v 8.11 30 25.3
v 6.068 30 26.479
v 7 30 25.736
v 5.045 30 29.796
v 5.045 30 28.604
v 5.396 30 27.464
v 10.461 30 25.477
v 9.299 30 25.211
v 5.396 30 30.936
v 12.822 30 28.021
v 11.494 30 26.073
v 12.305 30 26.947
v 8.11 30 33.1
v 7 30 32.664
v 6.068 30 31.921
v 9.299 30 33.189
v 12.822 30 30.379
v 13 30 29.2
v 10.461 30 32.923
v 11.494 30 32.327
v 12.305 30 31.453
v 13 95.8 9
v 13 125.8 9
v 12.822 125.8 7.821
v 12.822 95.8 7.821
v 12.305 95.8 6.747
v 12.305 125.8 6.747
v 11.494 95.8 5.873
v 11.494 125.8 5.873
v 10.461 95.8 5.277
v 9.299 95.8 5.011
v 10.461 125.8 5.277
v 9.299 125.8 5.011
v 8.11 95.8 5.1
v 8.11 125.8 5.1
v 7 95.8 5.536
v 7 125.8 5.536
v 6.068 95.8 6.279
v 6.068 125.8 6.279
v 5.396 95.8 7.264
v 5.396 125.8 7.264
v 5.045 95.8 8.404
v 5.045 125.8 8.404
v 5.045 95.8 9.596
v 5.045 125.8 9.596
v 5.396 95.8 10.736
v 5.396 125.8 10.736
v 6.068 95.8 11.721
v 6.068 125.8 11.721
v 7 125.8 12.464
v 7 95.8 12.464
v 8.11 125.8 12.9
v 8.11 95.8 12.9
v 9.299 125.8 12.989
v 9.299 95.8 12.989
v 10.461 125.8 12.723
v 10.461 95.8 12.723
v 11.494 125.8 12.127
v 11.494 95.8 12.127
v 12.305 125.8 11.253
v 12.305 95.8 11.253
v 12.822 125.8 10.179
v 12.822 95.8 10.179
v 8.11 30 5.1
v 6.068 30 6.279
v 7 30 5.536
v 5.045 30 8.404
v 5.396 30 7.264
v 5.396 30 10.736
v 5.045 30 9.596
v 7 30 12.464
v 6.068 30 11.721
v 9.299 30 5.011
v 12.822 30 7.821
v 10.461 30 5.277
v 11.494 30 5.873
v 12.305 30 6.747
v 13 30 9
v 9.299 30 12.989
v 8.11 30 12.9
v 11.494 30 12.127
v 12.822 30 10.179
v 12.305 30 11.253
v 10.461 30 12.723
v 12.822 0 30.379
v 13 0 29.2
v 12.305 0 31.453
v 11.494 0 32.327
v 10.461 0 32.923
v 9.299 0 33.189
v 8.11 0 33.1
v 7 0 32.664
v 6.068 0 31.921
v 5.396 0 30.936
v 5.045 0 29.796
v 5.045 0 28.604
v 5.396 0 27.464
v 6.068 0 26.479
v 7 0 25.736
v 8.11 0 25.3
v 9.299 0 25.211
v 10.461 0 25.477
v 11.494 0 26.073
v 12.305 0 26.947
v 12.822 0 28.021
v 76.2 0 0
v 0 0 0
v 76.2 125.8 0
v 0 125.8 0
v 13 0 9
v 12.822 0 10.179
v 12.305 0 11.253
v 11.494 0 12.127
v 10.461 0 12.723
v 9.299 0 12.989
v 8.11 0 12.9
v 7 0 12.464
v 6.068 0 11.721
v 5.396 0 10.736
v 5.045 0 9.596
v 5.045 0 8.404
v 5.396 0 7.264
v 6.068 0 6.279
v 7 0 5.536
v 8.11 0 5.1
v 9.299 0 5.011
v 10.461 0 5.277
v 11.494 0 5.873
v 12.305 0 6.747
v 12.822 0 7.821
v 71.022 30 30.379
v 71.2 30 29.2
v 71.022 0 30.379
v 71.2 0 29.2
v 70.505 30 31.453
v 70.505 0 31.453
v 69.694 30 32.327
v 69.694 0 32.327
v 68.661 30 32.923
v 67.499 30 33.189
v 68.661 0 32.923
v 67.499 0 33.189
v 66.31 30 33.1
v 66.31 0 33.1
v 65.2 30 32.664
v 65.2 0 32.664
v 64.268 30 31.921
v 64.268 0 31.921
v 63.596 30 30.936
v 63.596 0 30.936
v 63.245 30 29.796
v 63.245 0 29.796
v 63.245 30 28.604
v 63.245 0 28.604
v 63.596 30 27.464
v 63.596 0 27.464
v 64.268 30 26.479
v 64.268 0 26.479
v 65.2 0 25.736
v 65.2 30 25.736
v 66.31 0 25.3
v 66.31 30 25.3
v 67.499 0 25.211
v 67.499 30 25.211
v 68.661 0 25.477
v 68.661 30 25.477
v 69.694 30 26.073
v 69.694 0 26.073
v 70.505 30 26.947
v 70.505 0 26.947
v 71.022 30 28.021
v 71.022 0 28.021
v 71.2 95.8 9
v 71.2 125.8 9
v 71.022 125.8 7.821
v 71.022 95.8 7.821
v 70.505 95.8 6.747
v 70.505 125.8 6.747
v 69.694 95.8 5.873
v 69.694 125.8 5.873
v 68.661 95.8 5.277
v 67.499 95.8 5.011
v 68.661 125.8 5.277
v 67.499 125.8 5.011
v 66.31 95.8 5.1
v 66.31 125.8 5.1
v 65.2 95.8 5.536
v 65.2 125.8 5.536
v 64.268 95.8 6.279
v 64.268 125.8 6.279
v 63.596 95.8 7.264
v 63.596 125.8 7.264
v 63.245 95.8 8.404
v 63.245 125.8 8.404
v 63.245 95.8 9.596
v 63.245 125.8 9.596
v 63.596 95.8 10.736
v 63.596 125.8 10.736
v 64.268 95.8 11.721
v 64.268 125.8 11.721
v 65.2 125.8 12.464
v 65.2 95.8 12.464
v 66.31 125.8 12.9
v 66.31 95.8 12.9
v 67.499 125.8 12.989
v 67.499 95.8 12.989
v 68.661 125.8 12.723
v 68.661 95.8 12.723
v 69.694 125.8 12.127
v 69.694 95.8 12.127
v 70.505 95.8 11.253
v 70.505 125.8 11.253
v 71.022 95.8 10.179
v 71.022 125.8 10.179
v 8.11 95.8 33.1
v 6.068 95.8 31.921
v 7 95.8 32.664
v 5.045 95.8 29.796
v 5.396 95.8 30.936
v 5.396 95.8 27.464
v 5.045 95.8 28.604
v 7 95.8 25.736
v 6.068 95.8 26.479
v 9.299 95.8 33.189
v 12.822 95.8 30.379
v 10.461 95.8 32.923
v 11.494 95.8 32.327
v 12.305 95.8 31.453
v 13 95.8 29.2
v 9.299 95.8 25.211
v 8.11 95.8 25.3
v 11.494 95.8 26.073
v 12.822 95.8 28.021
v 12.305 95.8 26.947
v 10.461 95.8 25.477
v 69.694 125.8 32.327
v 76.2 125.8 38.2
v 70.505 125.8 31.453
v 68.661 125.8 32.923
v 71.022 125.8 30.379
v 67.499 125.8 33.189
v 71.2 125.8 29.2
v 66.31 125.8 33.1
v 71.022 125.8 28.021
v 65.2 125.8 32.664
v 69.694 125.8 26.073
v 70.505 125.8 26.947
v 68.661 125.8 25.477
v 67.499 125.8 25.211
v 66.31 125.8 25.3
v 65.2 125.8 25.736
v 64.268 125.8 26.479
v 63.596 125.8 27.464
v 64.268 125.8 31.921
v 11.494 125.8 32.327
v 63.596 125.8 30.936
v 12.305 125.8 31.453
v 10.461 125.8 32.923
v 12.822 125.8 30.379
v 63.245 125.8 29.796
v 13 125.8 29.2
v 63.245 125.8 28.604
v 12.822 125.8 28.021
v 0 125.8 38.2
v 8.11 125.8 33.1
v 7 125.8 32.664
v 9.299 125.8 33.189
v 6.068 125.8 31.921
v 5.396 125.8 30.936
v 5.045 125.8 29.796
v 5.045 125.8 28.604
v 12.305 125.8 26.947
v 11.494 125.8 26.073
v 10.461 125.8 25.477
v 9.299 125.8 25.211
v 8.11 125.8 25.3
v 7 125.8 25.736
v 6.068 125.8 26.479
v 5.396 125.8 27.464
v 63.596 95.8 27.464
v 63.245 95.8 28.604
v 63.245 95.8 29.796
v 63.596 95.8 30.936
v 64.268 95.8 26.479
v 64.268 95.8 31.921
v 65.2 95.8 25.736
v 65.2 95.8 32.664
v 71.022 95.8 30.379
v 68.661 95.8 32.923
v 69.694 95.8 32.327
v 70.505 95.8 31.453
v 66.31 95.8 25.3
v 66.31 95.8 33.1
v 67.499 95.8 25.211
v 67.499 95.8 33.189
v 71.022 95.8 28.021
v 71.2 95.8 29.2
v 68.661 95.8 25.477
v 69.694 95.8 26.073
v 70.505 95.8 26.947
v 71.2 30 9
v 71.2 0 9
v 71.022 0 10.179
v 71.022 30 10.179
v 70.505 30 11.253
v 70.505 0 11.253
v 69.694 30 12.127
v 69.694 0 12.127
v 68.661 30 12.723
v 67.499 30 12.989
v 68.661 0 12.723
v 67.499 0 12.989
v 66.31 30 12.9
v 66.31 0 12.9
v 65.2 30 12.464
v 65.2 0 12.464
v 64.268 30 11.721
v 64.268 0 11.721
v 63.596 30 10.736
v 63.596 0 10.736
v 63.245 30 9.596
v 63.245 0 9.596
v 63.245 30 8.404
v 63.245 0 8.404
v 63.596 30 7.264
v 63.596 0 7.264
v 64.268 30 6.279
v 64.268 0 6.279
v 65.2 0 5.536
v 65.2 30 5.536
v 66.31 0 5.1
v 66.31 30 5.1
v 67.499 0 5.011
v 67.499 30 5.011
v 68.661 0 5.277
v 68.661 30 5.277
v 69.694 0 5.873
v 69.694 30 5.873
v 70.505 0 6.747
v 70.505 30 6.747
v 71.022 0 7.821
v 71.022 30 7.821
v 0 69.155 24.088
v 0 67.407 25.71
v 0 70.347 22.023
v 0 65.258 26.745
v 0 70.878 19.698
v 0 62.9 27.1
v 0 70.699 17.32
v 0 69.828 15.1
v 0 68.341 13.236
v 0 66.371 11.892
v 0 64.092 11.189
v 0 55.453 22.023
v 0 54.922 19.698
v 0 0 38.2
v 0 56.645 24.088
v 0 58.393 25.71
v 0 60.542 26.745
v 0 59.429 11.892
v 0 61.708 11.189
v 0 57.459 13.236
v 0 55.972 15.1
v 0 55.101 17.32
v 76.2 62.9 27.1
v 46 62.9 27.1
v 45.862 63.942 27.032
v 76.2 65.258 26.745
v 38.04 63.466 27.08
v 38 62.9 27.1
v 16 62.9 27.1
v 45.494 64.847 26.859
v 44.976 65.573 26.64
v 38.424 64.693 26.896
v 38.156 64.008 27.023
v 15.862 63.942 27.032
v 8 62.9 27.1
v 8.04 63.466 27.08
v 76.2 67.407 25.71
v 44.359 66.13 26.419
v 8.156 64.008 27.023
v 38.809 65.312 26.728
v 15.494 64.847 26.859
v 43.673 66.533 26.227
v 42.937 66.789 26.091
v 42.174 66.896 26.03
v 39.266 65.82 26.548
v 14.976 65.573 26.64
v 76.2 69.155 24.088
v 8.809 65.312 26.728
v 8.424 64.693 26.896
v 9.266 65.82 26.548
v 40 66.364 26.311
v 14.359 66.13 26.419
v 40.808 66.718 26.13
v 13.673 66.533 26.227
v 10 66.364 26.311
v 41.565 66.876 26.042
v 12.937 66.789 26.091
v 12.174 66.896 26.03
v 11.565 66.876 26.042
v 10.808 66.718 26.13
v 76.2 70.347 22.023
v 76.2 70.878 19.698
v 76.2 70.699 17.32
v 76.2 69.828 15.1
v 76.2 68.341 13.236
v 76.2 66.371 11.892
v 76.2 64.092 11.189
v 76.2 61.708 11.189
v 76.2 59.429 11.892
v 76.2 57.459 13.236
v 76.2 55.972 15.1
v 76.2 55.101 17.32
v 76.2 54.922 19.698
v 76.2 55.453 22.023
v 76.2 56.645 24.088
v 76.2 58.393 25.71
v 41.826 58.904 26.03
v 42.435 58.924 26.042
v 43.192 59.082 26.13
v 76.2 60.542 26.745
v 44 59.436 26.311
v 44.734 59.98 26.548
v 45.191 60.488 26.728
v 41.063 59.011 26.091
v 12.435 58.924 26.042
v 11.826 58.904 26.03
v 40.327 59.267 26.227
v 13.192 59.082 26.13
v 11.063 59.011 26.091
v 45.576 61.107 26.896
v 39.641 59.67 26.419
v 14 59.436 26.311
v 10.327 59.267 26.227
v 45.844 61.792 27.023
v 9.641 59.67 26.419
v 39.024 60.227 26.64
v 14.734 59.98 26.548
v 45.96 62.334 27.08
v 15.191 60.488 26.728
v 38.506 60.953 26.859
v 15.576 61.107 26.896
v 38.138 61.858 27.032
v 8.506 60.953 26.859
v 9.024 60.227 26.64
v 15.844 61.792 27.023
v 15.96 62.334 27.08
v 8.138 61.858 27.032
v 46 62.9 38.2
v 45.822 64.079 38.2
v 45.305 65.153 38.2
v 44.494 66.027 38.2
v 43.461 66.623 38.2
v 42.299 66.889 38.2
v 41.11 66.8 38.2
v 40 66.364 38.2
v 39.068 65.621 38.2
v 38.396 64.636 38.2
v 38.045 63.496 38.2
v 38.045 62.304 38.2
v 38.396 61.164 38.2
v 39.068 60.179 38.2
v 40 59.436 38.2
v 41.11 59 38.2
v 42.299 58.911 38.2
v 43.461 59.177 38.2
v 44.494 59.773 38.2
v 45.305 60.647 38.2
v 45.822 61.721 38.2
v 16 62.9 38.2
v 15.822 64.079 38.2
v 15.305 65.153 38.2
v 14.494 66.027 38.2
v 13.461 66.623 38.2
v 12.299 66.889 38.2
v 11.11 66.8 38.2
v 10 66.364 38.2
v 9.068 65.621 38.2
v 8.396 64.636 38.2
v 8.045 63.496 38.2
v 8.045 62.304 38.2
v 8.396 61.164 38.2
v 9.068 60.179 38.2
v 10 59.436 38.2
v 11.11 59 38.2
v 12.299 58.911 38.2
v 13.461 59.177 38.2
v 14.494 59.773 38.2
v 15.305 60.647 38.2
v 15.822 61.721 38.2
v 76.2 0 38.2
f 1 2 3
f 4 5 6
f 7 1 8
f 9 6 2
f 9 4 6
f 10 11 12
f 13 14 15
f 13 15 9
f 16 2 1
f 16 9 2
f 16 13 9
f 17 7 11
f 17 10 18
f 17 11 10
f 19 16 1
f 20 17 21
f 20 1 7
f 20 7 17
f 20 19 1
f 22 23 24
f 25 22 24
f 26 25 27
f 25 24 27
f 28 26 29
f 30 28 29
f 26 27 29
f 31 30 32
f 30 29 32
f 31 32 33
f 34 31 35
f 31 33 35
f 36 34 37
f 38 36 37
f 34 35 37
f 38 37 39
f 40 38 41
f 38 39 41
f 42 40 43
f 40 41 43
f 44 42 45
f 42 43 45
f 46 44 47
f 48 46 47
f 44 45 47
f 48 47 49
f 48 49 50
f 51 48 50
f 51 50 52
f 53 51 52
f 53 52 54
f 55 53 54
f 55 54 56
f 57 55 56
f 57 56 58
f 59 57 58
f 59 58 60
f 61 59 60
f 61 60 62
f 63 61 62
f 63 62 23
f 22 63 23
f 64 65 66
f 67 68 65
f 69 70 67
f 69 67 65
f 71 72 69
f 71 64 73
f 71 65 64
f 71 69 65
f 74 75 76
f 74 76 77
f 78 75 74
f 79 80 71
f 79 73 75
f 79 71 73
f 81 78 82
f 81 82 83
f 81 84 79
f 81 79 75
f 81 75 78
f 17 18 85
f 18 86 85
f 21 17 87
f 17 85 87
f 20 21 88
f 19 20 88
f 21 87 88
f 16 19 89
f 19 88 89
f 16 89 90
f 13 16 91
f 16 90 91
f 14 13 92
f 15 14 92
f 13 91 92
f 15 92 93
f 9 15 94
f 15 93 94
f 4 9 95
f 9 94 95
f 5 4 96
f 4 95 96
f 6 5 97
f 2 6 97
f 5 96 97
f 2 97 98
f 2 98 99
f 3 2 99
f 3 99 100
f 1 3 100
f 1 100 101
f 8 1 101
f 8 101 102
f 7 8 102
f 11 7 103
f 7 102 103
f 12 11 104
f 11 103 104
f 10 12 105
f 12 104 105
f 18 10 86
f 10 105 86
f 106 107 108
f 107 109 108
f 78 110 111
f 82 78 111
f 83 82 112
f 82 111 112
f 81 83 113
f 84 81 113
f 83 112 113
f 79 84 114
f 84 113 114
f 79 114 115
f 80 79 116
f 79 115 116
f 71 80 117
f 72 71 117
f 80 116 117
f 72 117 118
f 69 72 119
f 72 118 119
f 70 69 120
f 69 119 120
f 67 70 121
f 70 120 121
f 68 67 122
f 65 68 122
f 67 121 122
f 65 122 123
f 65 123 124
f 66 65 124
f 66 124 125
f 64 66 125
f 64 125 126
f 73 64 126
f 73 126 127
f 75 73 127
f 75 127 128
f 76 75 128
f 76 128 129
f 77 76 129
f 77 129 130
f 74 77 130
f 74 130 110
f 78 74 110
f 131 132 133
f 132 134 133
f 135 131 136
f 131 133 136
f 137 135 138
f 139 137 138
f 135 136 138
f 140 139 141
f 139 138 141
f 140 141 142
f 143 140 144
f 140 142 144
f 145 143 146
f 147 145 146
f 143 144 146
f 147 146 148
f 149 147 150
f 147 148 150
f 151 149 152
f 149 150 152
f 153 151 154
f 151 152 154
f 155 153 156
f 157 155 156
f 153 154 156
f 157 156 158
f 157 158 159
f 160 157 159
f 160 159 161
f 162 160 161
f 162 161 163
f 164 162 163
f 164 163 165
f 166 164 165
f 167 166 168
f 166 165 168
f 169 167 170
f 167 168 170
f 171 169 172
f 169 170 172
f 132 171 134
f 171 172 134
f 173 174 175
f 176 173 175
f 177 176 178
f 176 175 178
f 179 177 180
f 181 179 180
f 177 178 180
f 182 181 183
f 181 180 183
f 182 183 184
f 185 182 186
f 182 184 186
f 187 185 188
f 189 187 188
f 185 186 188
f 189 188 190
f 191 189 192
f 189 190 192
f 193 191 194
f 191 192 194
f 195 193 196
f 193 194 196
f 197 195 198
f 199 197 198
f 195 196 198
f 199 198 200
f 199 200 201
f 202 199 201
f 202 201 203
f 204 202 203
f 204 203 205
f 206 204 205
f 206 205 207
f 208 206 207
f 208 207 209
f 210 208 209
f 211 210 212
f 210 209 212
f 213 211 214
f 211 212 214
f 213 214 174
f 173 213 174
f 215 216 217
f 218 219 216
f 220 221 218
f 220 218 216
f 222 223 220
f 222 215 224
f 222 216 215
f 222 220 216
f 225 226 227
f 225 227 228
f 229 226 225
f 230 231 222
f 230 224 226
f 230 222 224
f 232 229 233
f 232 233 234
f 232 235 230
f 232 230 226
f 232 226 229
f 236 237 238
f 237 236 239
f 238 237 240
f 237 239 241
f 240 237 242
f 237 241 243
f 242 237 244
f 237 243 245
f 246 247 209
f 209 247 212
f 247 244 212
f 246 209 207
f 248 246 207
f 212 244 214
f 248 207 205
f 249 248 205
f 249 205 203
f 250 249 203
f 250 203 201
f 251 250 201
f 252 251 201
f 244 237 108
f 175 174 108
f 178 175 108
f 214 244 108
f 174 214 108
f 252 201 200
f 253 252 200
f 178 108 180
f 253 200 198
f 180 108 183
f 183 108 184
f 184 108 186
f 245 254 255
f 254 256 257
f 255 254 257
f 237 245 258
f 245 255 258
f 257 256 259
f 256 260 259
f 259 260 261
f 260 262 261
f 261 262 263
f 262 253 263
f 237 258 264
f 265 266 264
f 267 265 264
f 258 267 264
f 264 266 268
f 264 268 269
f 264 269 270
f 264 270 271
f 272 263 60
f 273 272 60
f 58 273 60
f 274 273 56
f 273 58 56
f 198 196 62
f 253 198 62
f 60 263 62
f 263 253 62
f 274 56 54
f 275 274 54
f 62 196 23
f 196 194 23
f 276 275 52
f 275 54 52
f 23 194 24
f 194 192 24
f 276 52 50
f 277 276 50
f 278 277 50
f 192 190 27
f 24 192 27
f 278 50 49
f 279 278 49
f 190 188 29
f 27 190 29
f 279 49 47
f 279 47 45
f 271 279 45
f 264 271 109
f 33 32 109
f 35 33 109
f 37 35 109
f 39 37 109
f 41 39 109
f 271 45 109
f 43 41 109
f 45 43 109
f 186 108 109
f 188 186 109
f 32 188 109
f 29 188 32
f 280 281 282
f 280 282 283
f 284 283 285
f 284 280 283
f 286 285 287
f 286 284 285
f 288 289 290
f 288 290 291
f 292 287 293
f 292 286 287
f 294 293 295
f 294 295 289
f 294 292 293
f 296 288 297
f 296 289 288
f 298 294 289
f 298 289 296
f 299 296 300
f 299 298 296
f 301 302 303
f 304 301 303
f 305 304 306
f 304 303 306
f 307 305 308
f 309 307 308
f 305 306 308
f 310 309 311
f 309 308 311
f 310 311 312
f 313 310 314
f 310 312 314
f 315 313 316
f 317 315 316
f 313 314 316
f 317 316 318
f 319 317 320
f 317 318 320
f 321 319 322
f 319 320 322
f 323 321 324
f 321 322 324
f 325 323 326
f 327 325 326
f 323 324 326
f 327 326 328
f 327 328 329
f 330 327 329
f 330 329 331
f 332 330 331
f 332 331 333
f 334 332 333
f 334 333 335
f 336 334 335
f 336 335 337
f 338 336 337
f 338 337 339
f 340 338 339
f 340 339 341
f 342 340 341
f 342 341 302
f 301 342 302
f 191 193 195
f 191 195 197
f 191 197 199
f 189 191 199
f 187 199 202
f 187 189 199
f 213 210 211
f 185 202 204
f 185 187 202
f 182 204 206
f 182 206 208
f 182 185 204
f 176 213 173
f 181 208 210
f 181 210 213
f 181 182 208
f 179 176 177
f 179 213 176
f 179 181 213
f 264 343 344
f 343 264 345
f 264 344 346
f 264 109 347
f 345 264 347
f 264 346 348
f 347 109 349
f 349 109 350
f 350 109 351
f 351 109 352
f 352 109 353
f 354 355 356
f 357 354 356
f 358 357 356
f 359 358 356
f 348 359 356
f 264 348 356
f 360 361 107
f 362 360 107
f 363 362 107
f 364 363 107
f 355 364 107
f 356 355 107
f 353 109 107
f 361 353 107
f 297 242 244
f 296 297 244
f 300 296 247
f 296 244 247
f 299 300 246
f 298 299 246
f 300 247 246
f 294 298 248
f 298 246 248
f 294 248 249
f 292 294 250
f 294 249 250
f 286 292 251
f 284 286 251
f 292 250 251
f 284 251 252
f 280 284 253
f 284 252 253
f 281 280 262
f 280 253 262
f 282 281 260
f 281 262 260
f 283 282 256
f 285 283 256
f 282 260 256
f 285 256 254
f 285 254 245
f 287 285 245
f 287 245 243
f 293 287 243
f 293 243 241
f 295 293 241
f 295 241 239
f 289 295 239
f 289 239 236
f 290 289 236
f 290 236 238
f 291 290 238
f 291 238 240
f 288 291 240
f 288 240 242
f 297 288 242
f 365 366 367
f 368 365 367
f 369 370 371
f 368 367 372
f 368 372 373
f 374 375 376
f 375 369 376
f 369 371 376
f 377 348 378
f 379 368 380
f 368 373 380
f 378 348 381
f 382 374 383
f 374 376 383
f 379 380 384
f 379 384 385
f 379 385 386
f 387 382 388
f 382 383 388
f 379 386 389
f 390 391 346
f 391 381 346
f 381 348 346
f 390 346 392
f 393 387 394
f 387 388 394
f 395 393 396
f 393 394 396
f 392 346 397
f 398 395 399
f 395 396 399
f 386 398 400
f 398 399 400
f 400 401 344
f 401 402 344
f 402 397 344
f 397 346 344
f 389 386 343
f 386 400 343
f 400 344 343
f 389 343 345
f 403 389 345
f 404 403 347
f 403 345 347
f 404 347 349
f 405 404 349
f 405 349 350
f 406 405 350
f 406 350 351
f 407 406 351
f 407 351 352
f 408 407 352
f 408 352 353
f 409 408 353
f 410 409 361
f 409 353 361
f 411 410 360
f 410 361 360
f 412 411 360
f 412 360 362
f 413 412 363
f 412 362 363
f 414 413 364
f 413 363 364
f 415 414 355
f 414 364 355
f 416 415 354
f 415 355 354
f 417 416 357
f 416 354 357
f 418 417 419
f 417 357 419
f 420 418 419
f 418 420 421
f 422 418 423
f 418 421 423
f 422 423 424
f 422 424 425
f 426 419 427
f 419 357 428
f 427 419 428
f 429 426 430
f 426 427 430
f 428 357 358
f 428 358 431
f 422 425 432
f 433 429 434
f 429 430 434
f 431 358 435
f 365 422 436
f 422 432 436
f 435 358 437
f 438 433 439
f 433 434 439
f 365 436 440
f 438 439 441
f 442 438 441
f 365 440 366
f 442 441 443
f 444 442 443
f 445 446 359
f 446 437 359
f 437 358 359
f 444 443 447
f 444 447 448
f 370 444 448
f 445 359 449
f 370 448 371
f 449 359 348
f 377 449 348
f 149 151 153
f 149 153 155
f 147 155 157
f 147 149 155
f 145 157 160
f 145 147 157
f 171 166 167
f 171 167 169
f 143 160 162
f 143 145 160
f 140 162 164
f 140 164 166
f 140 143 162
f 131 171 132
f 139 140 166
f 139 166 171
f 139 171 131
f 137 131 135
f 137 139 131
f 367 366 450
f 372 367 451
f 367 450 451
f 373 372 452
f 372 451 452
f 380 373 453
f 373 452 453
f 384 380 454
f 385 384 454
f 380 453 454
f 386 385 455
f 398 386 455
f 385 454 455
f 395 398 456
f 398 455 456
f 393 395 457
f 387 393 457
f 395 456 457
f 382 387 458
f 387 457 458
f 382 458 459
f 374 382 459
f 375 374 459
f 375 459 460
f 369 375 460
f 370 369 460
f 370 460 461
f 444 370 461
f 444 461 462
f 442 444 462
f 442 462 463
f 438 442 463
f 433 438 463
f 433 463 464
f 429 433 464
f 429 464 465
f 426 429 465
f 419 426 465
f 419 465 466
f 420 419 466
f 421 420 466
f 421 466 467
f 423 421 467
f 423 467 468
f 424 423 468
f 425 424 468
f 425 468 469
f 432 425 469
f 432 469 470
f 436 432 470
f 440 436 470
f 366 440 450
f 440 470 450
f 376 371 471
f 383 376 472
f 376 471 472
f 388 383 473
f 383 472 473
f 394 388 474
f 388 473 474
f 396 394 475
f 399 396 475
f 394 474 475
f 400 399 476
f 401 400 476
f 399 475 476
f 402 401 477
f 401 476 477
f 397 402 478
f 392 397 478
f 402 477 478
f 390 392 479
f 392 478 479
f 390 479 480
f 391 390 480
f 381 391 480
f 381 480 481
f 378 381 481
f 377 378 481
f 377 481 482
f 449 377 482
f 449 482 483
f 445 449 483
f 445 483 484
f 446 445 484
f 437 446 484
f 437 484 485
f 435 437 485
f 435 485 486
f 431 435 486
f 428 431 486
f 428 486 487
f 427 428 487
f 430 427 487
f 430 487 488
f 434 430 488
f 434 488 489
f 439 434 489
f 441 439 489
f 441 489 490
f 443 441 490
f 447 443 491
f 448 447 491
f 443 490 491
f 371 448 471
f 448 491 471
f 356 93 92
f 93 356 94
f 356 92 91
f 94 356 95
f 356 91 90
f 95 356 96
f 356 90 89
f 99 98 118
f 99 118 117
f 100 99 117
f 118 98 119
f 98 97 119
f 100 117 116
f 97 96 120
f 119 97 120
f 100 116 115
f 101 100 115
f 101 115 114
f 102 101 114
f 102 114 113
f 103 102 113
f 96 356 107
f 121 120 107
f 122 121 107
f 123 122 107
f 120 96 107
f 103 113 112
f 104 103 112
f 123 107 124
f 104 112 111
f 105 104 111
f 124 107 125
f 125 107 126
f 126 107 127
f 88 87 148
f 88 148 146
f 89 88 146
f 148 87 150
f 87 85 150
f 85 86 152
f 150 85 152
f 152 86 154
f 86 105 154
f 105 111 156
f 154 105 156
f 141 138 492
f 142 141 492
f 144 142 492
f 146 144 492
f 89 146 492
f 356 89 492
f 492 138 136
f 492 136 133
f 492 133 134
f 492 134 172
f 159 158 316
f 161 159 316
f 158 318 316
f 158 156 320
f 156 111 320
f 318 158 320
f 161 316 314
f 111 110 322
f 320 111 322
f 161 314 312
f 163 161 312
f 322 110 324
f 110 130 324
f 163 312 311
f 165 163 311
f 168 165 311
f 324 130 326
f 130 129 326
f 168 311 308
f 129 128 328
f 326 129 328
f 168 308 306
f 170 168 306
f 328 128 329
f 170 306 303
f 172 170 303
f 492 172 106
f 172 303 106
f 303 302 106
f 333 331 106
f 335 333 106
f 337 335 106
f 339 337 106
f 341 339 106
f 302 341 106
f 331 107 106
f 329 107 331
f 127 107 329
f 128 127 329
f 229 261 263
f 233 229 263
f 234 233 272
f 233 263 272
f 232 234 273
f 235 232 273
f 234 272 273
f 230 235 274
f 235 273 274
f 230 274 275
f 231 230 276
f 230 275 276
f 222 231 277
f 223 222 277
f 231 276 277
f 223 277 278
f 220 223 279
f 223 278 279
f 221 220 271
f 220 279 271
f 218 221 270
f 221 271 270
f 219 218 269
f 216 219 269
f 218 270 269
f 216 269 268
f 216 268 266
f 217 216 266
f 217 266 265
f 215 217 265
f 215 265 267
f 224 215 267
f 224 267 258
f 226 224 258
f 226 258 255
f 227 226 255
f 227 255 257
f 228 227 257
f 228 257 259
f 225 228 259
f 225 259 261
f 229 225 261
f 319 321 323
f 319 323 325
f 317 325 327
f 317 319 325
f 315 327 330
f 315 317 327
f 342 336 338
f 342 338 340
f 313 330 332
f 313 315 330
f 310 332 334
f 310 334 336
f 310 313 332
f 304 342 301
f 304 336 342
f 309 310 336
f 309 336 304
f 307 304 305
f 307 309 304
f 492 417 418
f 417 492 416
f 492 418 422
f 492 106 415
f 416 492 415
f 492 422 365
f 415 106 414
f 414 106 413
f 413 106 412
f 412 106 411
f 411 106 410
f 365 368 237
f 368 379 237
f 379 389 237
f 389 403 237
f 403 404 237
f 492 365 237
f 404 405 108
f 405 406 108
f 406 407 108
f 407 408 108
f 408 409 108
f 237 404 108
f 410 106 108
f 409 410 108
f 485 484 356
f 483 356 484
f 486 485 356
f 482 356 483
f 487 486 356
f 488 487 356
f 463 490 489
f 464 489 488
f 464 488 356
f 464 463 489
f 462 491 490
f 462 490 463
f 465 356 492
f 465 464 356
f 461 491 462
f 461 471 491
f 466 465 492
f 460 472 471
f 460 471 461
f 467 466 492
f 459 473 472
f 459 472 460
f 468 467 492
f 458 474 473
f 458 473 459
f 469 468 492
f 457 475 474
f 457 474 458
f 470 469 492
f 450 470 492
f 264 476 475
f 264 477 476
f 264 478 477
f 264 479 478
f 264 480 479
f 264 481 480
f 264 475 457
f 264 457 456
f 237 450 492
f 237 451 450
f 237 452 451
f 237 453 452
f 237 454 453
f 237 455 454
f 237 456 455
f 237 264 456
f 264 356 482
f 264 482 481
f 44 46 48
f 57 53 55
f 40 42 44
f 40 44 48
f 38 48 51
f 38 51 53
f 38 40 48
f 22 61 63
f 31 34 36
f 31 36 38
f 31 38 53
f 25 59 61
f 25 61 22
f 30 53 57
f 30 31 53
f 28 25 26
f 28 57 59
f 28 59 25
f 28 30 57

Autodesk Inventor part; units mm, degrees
ref_plane "YZ Plane" through (0, 0, 0) normal (1, 0, 0) x (0, 1, 0)
ref_plane "XZ Plane" through (0, 0, 0) normal (0, 1, 0) x (-1, 0, 0)
ref_plane "XY Plane" through (0, 0, 0) normal (0, 0, 1) x (1, 0, 0)
sketch "Sketch1" plane through (0, 0, 0) normal (0, 0, 1) x (1, 0, 0)
  line L0 (0, 0) -> (76.2, 0)
  line L1 (76.2, 0) -> (76.2, 125.8)
  line L2 (76.2, 125.8) -> (0, 125.8)
  line L3 (0, 125.8) -> (0, 0)
  circle A0 centre (12, 62.9) radius 4
  circle A1 centre (42, 62.9) radius 4
  dimension "d0" = 76.2
  dimension "d1" = 125.8
  dimension "d2" = 8
  dimension "d3" = 8
  dimension "d4" = 12
  dimension "d5" = 42
  dimension "d6" = 62.9
  dimension "d7" = 62.9
extrude "Extrusion1" add sketch "Sketch1" along normal blind 38.2 contours L3 L2 L1 L0 | A0 | A1
sketch "Sketch2" plane through (0, 0, 38.2) normal (0, 0, 1) x (1, 0, 0)
  line L0 (0, 0) -> (76.2, 0)
  line L1 (76.2, 0) -> (76.2, 125.8)
  line L2 (76.2, 125.8) -> (0, 125.8)
  line L3 (0, 125.8) -> (0, 0)
  circle A0 centre (12, 62.9) radius 4
  circle A1 centre (42, 62.9) radius 4
  dimension "d17" = 76.2
  dimension "d16" = 125.8
  dimension "d13" = 8
  dimension "d10" = 8
  dimension "d15" = 12
  dimension "d12" = 42
  dimension "d11" = 62.9
  dimension "d14" = 62.9
extrude "Extrusion2" cut sketch "Sketch2" against normal blind 19.1 contours A0 | A1
sketch "Sketch3" plane through (0, 0, 0) normal (-1, 0, 0) x (0, 0, 1)
  circle A0 centre (19.1, 62.9) radius 8
  line L0 (38.2, 125.8) -> (38.2, 0) projected
  line L1 (0, 0) -> (38.2, 0) projected
  dimension "d21" = 16
  dimension "d22" = 19.1
  dimension "d23" = 62.9
extrude "Extrusion3" cut sketch "Sketch3" against normal up to next
thread "Thread1" size "M8x1.25" class "6H" standard "ANSI Metric M Profile" full length
thread "Thread2" size "M8x1.25" class "6H" standard "ANSI Metric M Profile" full length
sketch "Sketch4" plane through (0, 0, 0) normal (0, -1, 0) x (1, 0, 0)
  circle A0 centre (9, 29.2) radius 4
  circle A1 centre (9, 9) radius 4
  circle A2 centre (67.2, 29.2) radius 4
  circle A3 centre (67.2, 9) radius 4
  line L0 (0, 38.2) -> (76.2, 38.2) projected
  line L1 (0, 0) -> (0, 38.2) projected
  dimension "d33" = 8
  dimension "d34" = 8
  dimension "d35" = 8
  dimension "d36" = 8
  dimension "d41" = 20.2
  dimension "d42" = 58.2
  dimension "d45" = 20.2
  dimension "d46" = 58.2
  dimension "d48" = 9
  dimension "d49" = 9
  dimension "d51" = 9
  dimension "d52" = 9
extrude "Extrusion4" cut sketch "Sketch4" against normal blind 30
sketch "Sketch5" plane through (0, 125.8, 38.2) normal (0, 1, 0) x (1, 0, 0)
  circle A0 centre (67.2, 29.2) radius 4
  circle A1 centre (67.2, 9) radius 4
  circle A2 centre (9, 29.2) radius 4
  circle A3 centre (9, 9) radius 4
  line L0 (0, 38.2) -> (76.2, 38.2)
  line L1 (0, 0) -> (0, 38.2)
  dimension "d56" = 8
  dimension "d55" = 8
  dimension "d64" = 8
  dimension "d63" = 8
  dimension "d65" = 20.2
  dimension "d59" = 58.2
  dimension "d58" = 20.2
  dimension "d62" = 58.2
  dimension "d61" = 9
  dimension "d66" = 9
  dimension "d60" = 9
  dimension "d57" = 9
extrude "Extrusion5" cut sketch "Sketch5" against normal blind 30
thread "Thread3" size "M8x1.25" class "6H" standard "ANSI Metric M Profile" full length
thread "Thread4" size "M8x1.25" class "6H" standard "ANSI Metric M Profile" full length
thread "Thread5" size "M8x1.25" class "6H" standard "ANSI Metric M Profile" full length
thread "Thread6" size "M8x1.25" class "6H" standard "ANSI Metric M Profile" full length
thread "Thread7" size "M8x1.25" class "6H" standard "ANSI Metric M Profile" full length
thread "Thread8" size "M8x1.25" class "6H" standard "ANSI Metric M Profile" full length
thread "Thread9" size "M8x1.25" class "6H" standard "ANSI Metric M Profile" full length
thread "Thread10" size "M8x1.25" class "6H" standard "ANSI Metric M Profile" full length
properties part number "MotorMountRight" material "Aluminum 6061"
